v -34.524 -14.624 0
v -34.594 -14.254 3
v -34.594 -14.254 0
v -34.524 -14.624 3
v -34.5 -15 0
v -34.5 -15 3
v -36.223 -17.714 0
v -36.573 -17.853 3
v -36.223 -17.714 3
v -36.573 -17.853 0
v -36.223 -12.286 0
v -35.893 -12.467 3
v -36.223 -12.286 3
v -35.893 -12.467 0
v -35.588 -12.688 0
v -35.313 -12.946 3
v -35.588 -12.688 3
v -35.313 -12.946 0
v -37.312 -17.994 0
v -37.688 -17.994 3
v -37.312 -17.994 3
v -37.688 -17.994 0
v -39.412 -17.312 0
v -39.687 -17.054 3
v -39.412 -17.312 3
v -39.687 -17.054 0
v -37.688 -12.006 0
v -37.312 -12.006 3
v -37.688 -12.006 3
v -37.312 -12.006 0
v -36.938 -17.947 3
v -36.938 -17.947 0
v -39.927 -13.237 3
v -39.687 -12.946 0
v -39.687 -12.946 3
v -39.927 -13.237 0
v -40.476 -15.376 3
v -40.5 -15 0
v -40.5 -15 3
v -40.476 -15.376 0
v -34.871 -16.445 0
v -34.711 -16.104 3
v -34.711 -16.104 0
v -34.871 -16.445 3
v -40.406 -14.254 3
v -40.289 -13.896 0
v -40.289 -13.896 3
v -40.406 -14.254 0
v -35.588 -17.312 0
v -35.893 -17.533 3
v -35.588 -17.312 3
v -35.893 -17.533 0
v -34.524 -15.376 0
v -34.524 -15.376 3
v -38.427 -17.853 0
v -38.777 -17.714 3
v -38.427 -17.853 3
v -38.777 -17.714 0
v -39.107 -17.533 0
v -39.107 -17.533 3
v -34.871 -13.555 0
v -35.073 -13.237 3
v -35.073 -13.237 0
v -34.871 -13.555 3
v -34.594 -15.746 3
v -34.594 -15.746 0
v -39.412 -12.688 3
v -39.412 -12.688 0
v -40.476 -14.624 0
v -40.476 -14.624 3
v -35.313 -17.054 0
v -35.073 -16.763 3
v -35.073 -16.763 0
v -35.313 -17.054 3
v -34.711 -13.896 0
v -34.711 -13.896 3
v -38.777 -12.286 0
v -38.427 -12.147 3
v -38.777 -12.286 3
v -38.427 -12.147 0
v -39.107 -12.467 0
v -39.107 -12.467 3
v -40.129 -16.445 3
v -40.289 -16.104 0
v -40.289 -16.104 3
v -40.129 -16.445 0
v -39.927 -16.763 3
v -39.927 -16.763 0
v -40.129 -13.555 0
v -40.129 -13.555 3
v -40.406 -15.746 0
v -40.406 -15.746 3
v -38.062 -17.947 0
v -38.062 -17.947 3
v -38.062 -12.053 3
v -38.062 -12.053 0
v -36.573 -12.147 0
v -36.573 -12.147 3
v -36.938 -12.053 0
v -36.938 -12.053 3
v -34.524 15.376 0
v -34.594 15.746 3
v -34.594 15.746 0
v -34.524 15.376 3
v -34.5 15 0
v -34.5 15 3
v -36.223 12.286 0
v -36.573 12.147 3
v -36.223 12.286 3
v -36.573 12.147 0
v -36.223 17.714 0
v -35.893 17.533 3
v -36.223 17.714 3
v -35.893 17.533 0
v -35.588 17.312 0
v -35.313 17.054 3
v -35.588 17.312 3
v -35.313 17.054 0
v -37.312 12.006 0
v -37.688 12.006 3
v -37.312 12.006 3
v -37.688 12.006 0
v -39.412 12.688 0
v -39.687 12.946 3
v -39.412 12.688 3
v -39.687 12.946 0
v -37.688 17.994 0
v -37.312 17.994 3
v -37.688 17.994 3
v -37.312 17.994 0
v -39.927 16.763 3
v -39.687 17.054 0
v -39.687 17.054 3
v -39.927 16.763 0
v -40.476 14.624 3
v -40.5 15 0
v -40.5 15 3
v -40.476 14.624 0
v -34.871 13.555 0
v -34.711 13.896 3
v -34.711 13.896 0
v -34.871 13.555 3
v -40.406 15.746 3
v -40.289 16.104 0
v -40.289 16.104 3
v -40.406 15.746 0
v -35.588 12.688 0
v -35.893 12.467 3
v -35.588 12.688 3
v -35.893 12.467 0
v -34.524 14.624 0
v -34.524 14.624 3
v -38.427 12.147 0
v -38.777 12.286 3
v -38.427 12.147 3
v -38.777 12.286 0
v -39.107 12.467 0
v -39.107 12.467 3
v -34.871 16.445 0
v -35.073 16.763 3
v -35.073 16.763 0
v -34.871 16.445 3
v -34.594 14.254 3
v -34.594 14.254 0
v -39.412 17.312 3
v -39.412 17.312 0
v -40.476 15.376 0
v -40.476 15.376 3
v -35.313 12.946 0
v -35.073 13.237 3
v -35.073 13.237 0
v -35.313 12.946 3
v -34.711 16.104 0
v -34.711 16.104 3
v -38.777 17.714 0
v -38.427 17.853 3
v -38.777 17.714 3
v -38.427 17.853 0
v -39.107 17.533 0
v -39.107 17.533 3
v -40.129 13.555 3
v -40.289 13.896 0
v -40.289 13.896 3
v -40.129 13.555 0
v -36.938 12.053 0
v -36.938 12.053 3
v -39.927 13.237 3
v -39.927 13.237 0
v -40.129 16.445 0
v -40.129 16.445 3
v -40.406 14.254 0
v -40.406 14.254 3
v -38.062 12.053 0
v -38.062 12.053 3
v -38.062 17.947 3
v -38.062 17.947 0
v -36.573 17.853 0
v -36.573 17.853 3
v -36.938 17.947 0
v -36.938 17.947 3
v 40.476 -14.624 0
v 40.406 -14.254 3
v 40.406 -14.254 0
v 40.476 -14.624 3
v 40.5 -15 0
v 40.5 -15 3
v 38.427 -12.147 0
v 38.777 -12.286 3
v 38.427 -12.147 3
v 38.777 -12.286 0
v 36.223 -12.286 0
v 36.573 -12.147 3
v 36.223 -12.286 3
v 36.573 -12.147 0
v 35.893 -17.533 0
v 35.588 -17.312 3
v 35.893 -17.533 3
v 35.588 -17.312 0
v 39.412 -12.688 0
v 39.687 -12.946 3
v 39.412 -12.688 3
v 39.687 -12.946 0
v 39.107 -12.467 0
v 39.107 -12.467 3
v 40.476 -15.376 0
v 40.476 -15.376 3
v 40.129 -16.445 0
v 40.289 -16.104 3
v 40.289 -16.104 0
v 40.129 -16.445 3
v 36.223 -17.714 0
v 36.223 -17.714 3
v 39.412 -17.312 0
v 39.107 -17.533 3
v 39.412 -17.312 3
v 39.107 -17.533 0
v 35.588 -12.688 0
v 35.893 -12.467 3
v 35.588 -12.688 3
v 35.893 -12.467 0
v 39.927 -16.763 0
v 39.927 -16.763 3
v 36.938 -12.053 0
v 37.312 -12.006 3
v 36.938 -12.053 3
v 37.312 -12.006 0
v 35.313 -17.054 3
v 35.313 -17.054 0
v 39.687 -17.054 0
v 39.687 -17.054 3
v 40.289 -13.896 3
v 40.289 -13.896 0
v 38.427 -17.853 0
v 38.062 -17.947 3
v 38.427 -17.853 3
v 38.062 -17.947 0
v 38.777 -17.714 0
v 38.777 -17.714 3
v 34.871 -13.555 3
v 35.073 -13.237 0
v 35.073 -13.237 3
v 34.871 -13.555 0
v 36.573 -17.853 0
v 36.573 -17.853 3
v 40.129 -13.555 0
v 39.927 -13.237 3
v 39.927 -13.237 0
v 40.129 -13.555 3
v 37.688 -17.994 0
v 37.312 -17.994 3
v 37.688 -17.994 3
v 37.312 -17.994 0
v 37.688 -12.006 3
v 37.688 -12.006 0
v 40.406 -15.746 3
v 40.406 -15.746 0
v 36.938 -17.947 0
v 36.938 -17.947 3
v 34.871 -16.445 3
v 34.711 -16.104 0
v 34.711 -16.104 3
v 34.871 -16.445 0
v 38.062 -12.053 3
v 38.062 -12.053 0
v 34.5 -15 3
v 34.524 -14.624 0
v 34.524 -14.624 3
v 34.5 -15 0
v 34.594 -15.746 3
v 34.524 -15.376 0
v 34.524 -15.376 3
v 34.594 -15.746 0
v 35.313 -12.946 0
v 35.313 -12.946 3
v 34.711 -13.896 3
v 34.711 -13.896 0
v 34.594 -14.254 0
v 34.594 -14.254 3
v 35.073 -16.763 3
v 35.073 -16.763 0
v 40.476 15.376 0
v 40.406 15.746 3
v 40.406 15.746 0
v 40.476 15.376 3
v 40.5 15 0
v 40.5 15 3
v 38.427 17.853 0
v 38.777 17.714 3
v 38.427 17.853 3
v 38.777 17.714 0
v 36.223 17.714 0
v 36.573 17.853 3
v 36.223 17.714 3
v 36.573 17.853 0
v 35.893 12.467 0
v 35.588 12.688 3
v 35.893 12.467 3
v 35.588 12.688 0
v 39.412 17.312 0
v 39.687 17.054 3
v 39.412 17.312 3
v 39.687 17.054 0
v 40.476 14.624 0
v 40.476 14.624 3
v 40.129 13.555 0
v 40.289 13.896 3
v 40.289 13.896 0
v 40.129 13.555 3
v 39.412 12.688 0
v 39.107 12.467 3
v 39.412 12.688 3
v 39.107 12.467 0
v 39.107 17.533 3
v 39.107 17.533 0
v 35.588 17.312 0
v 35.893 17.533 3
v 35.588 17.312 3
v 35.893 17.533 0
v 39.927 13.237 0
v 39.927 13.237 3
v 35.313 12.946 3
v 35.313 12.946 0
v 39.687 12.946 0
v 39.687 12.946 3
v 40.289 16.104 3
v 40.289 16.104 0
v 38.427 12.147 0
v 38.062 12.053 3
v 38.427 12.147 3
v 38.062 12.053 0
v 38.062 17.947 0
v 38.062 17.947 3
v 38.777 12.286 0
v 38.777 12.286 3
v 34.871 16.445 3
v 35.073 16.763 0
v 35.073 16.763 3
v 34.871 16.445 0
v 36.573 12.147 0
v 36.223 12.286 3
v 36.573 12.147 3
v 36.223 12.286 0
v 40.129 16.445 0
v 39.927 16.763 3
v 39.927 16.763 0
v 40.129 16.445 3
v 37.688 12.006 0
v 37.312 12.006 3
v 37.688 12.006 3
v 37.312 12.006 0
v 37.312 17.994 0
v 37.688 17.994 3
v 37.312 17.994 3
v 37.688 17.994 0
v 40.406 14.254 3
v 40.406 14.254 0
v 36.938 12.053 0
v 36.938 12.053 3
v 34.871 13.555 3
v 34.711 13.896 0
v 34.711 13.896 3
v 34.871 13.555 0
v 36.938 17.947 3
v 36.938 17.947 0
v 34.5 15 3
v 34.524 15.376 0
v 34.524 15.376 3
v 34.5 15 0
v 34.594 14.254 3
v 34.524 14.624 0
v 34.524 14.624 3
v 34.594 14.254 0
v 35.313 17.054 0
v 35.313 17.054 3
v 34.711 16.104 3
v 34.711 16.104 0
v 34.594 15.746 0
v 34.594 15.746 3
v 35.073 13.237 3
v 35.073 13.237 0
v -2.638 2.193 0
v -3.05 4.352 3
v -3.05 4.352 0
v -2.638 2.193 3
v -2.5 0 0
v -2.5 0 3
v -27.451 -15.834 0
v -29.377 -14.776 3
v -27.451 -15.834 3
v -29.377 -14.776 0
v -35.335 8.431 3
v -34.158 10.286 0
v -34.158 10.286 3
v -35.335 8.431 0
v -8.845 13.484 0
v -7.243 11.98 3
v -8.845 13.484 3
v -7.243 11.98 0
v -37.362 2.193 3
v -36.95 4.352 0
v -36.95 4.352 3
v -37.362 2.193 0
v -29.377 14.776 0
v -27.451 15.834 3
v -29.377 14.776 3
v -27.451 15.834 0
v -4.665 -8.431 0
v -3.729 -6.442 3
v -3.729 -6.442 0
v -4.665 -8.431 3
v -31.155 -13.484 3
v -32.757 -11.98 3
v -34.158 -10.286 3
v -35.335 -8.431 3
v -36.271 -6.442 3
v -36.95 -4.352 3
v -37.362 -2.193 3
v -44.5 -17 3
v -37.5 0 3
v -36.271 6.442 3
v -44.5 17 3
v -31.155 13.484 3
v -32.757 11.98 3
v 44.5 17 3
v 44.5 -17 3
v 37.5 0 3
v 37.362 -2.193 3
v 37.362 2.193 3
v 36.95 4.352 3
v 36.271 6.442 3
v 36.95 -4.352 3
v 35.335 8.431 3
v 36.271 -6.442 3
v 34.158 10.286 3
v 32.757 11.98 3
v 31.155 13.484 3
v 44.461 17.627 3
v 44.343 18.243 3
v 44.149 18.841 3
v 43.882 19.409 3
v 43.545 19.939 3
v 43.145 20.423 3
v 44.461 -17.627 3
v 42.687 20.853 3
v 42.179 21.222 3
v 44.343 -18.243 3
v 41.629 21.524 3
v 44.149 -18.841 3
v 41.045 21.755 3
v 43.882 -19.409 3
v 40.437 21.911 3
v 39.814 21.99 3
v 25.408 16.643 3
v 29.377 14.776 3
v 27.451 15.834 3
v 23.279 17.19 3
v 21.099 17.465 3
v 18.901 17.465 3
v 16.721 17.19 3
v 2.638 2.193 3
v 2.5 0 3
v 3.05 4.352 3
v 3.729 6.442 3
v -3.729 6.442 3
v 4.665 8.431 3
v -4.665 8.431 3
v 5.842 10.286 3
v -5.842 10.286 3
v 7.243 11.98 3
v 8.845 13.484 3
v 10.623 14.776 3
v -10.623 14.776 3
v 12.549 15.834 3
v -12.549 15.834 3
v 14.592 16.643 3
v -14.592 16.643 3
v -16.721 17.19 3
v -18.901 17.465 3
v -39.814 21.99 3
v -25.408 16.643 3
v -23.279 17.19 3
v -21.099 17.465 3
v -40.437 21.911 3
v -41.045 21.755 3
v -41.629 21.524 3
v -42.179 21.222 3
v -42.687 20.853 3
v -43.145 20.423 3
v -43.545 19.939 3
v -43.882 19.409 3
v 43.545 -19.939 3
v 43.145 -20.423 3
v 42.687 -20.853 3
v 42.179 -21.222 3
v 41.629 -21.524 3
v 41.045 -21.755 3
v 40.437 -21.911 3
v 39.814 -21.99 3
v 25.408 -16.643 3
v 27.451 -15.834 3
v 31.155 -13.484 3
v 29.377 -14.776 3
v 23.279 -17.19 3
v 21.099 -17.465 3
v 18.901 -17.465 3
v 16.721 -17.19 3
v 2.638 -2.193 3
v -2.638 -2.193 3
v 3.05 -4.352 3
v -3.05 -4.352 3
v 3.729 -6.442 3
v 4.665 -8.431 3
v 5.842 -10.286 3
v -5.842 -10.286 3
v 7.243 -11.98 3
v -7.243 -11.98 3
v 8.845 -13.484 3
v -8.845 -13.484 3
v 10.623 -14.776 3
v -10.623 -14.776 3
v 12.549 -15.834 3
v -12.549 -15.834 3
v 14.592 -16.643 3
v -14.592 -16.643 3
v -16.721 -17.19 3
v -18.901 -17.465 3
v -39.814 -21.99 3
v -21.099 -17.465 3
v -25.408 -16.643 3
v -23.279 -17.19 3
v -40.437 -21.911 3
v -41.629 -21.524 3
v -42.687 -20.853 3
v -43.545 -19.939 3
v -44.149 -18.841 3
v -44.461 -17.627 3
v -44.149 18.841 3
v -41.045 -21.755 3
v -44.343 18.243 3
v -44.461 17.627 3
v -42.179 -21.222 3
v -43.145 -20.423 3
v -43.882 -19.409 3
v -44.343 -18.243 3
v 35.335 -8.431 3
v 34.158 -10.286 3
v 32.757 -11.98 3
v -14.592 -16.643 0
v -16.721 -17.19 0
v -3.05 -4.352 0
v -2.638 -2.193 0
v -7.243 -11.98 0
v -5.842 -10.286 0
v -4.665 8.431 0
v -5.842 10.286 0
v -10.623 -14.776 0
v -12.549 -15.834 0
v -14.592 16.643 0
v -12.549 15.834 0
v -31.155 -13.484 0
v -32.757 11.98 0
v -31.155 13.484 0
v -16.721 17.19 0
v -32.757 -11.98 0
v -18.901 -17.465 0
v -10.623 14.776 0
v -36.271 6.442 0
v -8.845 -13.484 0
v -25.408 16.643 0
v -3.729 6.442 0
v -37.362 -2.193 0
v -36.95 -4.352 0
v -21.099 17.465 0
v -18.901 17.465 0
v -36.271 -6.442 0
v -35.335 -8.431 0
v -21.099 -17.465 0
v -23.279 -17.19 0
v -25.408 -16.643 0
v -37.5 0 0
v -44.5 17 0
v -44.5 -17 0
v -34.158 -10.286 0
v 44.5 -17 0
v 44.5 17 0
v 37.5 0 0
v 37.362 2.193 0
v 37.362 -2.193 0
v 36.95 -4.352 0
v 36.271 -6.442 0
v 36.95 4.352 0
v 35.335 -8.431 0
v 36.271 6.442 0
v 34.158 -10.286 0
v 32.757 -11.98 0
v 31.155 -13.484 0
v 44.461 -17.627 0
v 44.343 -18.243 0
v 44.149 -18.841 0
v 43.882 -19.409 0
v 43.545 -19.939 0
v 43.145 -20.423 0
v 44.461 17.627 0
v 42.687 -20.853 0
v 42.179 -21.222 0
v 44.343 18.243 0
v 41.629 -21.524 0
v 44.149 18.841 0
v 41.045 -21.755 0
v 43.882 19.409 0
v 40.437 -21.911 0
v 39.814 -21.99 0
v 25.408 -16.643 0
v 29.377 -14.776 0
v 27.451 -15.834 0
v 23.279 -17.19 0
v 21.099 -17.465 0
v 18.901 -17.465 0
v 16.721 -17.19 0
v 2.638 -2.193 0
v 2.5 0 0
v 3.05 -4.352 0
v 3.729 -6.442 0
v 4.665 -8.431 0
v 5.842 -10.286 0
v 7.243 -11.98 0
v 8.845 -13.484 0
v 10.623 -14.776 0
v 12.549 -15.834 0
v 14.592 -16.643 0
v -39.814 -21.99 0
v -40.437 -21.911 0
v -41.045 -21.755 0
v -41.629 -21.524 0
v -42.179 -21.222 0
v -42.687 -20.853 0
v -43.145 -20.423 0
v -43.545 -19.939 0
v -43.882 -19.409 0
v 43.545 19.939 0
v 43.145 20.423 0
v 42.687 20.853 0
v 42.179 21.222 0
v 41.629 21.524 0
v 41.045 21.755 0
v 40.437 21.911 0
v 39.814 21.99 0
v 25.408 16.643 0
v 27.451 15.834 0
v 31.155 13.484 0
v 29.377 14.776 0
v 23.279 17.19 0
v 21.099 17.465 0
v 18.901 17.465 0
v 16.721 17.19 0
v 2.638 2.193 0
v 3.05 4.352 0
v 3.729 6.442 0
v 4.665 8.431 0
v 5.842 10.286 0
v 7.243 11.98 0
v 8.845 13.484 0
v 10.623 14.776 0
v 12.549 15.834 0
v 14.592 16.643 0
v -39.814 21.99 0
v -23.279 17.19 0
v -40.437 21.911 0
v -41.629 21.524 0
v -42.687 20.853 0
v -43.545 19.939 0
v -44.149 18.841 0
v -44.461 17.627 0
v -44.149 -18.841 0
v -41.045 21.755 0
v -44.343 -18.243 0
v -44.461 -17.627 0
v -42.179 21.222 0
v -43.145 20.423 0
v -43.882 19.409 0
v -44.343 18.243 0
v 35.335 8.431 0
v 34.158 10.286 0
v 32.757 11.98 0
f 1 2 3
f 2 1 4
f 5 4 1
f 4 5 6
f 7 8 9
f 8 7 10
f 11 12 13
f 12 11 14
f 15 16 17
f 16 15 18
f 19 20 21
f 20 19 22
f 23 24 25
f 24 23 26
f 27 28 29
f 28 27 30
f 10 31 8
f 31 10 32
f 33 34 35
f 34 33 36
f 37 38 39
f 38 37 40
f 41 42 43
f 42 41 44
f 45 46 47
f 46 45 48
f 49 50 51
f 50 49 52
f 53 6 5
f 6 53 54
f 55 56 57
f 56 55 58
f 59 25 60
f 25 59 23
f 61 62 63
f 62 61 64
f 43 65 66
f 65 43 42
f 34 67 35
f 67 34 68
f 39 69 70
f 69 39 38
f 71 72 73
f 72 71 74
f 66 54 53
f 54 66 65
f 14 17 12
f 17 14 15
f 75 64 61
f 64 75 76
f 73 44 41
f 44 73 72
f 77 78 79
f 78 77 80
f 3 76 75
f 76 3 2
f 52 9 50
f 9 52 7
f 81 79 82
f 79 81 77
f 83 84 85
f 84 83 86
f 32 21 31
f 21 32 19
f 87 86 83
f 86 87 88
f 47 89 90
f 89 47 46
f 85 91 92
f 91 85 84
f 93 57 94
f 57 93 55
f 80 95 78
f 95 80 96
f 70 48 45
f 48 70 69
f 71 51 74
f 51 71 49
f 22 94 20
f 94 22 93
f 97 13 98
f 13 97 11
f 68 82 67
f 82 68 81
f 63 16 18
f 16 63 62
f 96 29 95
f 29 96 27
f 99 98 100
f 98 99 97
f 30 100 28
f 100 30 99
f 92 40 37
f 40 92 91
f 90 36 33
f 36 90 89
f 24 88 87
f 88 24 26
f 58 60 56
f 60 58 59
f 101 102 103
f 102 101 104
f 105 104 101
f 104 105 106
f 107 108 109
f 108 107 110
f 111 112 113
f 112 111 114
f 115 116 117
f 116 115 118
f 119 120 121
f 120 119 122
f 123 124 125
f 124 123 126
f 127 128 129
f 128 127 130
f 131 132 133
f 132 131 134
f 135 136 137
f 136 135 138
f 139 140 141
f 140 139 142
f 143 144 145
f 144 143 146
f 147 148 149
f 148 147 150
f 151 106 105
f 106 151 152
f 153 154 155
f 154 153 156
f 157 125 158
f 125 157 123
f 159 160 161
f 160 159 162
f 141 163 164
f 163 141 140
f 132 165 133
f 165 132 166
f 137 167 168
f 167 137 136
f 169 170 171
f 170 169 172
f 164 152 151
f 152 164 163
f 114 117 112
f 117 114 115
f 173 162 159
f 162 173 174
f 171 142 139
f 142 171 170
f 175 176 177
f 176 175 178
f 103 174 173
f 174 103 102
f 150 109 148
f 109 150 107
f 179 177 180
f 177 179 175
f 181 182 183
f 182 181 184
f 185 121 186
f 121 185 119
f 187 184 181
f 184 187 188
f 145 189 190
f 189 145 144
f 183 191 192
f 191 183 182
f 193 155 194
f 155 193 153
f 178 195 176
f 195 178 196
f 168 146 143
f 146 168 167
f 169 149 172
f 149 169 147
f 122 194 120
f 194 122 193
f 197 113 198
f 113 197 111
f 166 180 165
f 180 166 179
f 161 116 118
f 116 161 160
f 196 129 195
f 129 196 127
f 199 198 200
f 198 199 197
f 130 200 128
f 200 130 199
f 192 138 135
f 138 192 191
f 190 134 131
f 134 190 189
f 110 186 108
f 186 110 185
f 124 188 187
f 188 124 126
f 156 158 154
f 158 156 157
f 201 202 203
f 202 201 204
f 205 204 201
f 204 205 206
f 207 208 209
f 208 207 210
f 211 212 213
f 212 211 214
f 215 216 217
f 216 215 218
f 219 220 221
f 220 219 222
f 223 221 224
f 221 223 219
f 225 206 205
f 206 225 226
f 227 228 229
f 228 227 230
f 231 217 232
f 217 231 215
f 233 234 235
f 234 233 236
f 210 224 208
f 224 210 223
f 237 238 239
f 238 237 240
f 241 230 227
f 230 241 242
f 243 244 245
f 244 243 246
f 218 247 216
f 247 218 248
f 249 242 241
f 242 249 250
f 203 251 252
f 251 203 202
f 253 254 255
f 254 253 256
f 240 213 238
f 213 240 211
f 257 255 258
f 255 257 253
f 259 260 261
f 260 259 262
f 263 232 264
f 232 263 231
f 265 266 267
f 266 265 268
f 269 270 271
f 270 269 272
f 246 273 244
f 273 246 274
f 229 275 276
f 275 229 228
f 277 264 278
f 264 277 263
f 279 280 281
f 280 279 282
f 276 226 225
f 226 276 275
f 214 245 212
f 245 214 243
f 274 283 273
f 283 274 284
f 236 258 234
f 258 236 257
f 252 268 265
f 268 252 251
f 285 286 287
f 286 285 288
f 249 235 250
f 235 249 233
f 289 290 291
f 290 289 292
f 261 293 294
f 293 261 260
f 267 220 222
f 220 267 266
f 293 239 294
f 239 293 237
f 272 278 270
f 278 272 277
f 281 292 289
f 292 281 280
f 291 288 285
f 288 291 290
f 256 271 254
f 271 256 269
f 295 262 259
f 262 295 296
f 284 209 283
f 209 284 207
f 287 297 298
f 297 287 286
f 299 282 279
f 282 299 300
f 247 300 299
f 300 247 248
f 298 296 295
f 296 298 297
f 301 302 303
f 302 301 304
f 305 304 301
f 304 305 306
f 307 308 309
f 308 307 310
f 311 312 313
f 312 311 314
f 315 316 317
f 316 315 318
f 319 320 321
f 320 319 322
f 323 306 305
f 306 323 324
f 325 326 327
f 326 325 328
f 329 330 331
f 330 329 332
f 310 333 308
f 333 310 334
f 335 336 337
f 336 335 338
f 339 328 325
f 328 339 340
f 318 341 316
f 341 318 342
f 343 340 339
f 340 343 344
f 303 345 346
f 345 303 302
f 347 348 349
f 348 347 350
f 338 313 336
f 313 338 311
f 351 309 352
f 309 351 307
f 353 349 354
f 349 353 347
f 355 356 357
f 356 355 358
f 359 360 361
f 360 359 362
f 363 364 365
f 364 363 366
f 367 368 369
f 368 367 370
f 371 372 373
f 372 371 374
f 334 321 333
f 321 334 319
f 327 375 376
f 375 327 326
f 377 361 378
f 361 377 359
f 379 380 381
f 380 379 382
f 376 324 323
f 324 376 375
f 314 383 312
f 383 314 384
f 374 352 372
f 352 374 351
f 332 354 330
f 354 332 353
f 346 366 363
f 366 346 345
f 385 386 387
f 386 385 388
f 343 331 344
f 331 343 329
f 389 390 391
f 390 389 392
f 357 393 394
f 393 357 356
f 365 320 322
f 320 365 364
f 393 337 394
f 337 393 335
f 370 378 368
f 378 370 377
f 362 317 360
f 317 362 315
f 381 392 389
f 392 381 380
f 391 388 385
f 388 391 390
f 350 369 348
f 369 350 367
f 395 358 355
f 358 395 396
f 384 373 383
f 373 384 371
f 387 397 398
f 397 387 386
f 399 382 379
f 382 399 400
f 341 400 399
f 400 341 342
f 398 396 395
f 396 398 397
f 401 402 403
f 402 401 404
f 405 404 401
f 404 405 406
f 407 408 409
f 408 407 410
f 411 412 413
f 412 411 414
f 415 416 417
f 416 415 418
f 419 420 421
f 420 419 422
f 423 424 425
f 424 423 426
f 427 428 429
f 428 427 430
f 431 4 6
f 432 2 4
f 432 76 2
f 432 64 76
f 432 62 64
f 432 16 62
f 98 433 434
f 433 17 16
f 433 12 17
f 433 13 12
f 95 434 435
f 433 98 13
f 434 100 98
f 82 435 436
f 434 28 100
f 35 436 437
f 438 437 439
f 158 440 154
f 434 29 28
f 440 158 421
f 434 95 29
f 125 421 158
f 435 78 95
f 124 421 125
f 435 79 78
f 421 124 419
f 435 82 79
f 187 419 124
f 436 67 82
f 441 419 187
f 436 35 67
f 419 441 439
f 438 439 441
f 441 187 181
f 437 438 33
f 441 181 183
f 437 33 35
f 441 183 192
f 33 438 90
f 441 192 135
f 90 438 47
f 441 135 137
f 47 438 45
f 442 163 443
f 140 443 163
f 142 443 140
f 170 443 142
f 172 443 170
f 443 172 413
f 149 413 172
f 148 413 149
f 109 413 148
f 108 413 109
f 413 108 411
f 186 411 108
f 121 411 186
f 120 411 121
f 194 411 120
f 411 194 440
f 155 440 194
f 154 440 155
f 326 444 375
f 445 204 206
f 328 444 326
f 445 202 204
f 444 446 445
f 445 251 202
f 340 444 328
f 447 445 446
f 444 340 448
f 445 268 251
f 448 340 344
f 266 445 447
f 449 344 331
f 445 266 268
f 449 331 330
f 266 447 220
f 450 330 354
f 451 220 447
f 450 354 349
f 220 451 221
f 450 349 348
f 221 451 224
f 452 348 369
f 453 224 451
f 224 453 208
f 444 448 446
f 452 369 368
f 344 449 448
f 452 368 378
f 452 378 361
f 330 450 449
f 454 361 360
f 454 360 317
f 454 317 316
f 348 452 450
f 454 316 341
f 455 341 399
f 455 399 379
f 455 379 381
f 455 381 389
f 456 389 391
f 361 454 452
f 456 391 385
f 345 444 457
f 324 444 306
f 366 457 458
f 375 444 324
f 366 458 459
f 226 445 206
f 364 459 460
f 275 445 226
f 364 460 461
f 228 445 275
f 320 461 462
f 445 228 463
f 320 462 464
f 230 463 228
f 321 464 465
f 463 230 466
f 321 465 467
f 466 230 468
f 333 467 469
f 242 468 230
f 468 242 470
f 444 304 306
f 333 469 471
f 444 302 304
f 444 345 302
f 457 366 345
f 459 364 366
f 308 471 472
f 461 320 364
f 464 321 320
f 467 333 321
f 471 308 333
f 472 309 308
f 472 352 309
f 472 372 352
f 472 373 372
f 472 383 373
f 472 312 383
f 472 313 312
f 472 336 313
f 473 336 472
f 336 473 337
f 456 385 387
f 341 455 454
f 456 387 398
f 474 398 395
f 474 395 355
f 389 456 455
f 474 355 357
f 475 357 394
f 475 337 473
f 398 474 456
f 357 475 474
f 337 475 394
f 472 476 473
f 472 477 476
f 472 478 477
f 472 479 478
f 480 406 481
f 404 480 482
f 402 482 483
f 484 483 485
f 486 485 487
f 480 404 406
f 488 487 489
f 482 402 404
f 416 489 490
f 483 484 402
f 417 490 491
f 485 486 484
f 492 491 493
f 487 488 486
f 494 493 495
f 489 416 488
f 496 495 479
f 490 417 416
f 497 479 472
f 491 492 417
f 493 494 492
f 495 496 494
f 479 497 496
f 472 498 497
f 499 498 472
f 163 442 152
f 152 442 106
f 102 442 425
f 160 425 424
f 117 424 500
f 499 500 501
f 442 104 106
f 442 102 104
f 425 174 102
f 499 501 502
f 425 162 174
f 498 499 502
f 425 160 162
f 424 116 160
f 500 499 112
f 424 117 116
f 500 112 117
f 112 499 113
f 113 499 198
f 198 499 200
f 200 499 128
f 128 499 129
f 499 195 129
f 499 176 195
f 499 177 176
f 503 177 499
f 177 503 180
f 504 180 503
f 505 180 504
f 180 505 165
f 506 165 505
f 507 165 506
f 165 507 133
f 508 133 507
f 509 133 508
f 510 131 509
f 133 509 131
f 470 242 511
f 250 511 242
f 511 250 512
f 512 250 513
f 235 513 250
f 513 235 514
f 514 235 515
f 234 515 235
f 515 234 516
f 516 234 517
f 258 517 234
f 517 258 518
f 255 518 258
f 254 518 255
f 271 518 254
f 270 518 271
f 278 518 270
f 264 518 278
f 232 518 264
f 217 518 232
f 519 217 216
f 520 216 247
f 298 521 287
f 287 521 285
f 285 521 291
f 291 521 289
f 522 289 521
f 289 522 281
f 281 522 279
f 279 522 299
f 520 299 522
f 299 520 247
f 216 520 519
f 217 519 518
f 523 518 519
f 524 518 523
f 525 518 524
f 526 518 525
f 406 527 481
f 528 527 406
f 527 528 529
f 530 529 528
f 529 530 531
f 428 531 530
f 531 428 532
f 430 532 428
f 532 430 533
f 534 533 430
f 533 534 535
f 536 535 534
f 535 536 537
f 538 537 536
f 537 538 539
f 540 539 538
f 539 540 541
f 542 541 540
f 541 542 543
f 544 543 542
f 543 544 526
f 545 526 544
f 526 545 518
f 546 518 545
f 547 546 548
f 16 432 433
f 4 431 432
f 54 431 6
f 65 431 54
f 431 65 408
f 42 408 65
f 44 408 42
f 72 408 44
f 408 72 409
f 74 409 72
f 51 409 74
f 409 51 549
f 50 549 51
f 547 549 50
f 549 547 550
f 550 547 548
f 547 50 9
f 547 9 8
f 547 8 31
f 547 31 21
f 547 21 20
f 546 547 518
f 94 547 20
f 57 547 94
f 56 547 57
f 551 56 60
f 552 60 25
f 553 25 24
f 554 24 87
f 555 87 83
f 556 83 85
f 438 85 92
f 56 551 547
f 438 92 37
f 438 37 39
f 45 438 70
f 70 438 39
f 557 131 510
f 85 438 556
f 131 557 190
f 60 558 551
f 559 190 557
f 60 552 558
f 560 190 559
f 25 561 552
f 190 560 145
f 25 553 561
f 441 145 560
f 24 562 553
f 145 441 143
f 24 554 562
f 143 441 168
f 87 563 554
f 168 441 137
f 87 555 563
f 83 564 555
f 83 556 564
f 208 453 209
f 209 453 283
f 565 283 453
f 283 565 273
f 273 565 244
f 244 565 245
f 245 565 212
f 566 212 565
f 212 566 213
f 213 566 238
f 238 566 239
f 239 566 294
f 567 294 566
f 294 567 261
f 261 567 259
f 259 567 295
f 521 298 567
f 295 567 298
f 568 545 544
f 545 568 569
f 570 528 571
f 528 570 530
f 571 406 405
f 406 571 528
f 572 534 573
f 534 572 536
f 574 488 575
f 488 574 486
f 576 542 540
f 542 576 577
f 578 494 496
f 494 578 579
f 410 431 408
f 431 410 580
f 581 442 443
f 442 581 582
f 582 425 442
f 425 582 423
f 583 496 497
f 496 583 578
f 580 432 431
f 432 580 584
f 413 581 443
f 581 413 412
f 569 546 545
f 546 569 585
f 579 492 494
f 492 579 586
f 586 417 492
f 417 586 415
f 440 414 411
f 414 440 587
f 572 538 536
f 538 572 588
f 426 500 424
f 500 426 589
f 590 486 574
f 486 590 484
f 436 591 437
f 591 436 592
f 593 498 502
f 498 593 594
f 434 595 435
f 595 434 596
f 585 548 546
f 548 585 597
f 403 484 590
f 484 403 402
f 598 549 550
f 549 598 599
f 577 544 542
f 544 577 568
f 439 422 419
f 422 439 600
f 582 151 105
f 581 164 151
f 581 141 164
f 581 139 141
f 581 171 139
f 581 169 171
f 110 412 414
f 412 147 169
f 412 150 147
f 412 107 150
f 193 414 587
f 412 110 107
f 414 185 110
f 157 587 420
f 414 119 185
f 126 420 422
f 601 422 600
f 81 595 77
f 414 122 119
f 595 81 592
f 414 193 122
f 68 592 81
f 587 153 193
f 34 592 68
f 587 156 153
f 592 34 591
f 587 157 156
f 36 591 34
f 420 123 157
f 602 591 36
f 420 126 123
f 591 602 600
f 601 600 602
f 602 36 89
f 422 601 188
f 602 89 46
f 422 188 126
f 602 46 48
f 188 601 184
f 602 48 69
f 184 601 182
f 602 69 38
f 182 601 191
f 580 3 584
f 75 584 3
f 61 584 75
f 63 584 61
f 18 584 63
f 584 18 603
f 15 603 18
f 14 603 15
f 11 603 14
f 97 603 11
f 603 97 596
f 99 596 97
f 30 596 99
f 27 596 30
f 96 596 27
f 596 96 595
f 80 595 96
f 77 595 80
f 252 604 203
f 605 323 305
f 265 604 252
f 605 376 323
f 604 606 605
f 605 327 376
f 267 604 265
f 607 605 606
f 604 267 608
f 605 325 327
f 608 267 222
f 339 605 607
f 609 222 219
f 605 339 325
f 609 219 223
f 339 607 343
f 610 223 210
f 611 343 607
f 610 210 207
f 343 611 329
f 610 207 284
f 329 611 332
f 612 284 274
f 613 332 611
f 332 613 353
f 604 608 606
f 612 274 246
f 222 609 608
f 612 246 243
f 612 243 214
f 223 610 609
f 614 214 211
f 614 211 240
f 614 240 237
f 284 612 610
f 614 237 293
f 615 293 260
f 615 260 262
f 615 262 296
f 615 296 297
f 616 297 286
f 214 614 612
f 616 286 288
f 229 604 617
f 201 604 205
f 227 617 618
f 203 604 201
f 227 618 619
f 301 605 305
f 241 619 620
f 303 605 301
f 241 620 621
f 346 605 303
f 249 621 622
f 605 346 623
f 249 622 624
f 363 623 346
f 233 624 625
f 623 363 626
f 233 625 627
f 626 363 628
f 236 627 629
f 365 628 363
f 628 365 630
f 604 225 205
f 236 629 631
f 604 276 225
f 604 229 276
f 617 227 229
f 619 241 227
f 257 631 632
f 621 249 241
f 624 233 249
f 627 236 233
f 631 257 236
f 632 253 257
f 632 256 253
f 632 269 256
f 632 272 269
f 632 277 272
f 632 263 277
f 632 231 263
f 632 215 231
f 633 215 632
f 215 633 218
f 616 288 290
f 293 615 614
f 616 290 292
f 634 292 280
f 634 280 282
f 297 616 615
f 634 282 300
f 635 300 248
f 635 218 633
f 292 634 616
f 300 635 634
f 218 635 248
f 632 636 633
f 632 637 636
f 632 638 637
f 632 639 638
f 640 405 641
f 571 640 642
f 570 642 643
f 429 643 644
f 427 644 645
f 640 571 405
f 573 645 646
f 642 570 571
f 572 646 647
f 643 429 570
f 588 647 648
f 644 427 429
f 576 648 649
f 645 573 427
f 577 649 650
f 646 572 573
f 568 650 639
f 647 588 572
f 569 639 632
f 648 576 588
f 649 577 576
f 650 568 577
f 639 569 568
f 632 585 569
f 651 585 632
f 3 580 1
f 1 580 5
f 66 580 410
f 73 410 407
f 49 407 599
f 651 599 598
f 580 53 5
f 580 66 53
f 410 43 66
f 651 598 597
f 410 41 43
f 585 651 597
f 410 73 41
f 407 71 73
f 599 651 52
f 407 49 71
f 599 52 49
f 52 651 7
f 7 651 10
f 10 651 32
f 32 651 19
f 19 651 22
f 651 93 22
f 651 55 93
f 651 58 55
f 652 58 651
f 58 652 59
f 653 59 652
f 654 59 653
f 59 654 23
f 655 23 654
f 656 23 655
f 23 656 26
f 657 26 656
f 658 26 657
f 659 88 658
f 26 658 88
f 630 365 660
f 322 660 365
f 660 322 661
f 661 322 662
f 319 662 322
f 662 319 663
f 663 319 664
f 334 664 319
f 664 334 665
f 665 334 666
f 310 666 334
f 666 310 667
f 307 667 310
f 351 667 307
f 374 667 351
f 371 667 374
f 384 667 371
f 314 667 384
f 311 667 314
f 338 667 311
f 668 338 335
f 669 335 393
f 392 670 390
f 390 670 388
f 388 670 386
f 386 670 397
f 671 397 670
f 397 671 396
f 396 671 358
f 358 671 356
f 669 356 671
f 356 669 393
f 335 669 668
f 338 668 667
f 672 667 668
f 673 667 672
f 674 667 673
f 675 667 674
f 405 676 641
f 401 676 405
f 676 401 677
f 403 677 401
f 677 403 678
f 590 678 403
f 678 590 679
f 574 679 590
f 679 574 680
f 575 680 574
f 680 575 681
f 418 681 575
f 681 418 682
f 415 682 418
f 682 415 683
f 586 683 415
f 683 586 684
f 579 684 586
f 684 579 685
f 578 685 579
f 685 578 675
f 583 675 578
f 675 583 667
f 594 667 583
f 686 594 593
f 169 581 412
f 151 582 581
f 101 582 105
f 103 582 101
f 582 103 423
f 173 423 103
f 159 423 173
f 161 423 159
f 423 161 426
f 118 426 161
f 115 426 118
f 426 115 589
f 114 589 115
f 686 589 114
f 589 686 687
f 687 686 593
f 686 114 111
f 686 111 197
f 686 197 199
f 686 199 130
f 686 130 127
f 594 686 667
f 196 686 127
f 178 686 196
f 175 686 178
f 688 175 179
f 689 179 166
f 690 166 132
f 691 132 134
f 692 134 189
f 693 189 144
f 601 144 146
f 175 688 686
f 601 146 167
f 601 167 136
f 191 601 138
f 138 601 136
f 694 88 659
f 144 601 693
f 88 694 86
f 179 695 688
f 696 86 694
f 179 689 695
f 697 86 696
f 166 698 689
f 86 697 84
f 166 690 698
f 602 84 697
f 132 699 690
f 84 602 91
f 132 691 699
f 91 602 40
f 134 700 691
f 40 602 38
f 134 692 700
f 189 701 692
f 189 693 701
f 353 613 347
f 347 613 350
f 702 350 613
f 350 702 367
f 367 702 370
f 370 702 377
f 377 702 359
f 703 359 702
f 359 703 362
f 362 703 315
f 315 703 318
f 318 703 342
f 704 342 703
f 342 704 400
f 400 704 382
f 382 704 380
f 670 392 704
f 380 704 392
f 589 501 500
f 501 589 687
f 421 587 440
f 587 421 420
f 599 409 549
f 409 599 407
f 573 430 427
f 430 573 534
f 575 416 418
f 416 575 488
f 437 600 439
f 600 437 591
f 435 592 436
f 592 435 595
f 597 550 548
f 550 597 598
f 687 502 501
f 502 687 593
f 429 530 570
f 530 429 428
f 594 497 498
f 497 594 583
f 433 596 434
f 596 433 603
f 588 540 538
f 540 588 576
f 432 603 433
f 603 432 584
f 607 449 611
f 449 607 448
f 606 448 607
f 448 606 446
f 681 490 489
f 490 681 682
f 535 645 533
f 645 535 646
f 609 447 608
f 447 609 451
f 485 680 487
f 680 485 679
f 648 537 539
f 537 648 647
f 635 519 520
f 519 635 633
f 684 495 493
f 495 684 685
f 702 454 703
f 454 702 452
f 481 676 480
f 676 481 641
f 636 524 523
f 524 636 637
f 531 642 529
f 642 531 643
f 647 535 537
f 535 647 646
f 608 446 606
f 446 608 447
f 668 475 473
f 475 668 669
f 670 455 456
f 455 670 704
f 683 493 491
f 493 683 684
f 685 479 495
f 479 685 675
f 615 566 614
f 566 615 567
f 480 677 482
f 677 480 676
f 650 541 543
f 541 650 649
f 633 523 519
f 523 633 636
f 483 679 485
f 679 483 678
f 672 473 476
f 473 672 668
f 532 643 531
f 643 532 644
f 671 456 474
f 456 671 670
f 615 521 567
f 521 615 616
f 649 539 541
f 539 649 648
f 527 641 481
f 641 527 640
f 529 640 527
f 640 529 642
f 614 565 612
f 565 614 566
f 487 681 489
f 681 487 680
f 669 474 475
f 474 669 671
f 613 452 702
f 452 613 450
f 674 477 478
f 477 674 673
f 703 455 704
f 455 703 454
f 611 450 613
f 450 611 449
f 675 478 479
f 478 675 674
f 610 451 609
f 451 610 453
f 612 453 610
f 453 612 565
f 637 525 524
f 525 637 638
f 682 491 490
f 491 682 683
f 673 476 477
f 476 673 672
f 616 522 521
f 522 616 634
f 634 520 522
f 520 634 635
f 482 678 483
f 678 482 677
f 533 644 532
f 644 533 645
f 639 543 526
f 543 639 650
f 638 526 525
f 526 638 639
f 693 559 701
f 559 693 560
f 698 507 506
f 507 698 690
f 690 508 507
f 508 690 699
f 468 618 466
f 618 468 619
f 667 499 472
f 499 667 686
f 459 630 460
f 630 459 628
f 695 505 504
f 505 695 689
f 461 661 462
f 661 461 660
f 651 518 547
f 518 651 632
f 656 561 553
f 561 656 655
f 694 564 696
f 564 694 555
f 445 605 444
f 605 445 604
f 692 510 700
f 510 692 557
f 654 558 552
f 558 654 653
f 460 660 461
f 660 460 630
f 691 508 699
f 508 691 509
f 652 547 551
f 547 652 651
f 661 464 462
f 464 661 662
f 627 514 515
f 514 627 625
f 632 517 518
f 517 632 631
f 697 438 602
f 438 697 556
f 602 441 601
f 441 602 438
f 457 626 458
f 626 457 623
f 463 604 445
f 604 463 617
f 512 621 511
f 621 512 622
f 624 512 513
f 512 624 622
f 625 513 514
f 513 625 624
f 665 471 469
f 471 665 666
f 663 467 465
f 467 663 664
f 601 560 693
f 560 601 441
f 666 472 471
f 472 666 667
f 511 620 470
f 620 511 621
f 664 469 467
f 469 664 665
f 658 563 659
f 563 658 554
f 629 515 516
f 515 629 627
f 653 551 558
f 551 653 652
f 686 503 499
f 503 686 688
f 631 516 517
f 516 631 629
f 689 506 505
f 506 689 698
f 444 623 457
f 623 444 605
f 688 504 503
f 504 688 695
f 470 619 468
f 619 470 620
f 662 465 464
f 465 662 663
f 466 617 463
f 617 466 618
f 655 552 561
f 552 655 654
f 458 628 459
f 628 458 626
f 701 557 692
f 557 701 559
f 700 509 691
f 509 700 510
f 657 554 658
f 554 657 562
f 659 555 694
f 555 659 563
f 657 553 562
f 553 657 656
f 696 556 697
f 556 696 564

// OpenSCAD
$fn = 50;


difference() {
	union() {
		hull() {
			translate(v = [-39.5000000000, 17.0000000000, 0]) {
				cylinder(h = 3, r = 5);
			}
			translate(v = [39.5000000000, 17.0000000000, 0]) {
				cylinder(h = 3, r = 5);
			}
			translate(v = [-39.5000000000, -17.0000000000, 0]) {
				cylinder(h = 3, r = 5);
			}
			translate(v = [39.5000000000, -17.0000000000, 0]) {
				cylinder(h = 3, r = 5);
			}
		}
	}
	union() {
		#translate(v = [-37.5000000000, -15.0000000000, -100.0000000000]) {
			cylinder(h = 200, r = 3.0000000000);
		}
		#translate(v = [-37.5000000000, 15.0000000000, -100.0000000000]) {
			cylinder(h = 200, r = 3.0000000000);
		}
		#translate(v = [37.5000000000, -15.0000000000, -100.0000000000]) {
			cylinder(h = 200, r = 3.0000000000);
		}
		#translate(v = [37.5000000000, 15.0000000000, -100.0000000000]) {
			cylinder(h = 200, r = 3.0000000000);
		}
		#translate(v = [-20.0000000000, 0, 0]) {
			cylinder(h = 3, r = 17.5000000000);
		}
		#translate(v = [20.0000000000, 0, 0]) {
			cylinder(h = 3, r = 17.5000000000);
		}
	}
}
